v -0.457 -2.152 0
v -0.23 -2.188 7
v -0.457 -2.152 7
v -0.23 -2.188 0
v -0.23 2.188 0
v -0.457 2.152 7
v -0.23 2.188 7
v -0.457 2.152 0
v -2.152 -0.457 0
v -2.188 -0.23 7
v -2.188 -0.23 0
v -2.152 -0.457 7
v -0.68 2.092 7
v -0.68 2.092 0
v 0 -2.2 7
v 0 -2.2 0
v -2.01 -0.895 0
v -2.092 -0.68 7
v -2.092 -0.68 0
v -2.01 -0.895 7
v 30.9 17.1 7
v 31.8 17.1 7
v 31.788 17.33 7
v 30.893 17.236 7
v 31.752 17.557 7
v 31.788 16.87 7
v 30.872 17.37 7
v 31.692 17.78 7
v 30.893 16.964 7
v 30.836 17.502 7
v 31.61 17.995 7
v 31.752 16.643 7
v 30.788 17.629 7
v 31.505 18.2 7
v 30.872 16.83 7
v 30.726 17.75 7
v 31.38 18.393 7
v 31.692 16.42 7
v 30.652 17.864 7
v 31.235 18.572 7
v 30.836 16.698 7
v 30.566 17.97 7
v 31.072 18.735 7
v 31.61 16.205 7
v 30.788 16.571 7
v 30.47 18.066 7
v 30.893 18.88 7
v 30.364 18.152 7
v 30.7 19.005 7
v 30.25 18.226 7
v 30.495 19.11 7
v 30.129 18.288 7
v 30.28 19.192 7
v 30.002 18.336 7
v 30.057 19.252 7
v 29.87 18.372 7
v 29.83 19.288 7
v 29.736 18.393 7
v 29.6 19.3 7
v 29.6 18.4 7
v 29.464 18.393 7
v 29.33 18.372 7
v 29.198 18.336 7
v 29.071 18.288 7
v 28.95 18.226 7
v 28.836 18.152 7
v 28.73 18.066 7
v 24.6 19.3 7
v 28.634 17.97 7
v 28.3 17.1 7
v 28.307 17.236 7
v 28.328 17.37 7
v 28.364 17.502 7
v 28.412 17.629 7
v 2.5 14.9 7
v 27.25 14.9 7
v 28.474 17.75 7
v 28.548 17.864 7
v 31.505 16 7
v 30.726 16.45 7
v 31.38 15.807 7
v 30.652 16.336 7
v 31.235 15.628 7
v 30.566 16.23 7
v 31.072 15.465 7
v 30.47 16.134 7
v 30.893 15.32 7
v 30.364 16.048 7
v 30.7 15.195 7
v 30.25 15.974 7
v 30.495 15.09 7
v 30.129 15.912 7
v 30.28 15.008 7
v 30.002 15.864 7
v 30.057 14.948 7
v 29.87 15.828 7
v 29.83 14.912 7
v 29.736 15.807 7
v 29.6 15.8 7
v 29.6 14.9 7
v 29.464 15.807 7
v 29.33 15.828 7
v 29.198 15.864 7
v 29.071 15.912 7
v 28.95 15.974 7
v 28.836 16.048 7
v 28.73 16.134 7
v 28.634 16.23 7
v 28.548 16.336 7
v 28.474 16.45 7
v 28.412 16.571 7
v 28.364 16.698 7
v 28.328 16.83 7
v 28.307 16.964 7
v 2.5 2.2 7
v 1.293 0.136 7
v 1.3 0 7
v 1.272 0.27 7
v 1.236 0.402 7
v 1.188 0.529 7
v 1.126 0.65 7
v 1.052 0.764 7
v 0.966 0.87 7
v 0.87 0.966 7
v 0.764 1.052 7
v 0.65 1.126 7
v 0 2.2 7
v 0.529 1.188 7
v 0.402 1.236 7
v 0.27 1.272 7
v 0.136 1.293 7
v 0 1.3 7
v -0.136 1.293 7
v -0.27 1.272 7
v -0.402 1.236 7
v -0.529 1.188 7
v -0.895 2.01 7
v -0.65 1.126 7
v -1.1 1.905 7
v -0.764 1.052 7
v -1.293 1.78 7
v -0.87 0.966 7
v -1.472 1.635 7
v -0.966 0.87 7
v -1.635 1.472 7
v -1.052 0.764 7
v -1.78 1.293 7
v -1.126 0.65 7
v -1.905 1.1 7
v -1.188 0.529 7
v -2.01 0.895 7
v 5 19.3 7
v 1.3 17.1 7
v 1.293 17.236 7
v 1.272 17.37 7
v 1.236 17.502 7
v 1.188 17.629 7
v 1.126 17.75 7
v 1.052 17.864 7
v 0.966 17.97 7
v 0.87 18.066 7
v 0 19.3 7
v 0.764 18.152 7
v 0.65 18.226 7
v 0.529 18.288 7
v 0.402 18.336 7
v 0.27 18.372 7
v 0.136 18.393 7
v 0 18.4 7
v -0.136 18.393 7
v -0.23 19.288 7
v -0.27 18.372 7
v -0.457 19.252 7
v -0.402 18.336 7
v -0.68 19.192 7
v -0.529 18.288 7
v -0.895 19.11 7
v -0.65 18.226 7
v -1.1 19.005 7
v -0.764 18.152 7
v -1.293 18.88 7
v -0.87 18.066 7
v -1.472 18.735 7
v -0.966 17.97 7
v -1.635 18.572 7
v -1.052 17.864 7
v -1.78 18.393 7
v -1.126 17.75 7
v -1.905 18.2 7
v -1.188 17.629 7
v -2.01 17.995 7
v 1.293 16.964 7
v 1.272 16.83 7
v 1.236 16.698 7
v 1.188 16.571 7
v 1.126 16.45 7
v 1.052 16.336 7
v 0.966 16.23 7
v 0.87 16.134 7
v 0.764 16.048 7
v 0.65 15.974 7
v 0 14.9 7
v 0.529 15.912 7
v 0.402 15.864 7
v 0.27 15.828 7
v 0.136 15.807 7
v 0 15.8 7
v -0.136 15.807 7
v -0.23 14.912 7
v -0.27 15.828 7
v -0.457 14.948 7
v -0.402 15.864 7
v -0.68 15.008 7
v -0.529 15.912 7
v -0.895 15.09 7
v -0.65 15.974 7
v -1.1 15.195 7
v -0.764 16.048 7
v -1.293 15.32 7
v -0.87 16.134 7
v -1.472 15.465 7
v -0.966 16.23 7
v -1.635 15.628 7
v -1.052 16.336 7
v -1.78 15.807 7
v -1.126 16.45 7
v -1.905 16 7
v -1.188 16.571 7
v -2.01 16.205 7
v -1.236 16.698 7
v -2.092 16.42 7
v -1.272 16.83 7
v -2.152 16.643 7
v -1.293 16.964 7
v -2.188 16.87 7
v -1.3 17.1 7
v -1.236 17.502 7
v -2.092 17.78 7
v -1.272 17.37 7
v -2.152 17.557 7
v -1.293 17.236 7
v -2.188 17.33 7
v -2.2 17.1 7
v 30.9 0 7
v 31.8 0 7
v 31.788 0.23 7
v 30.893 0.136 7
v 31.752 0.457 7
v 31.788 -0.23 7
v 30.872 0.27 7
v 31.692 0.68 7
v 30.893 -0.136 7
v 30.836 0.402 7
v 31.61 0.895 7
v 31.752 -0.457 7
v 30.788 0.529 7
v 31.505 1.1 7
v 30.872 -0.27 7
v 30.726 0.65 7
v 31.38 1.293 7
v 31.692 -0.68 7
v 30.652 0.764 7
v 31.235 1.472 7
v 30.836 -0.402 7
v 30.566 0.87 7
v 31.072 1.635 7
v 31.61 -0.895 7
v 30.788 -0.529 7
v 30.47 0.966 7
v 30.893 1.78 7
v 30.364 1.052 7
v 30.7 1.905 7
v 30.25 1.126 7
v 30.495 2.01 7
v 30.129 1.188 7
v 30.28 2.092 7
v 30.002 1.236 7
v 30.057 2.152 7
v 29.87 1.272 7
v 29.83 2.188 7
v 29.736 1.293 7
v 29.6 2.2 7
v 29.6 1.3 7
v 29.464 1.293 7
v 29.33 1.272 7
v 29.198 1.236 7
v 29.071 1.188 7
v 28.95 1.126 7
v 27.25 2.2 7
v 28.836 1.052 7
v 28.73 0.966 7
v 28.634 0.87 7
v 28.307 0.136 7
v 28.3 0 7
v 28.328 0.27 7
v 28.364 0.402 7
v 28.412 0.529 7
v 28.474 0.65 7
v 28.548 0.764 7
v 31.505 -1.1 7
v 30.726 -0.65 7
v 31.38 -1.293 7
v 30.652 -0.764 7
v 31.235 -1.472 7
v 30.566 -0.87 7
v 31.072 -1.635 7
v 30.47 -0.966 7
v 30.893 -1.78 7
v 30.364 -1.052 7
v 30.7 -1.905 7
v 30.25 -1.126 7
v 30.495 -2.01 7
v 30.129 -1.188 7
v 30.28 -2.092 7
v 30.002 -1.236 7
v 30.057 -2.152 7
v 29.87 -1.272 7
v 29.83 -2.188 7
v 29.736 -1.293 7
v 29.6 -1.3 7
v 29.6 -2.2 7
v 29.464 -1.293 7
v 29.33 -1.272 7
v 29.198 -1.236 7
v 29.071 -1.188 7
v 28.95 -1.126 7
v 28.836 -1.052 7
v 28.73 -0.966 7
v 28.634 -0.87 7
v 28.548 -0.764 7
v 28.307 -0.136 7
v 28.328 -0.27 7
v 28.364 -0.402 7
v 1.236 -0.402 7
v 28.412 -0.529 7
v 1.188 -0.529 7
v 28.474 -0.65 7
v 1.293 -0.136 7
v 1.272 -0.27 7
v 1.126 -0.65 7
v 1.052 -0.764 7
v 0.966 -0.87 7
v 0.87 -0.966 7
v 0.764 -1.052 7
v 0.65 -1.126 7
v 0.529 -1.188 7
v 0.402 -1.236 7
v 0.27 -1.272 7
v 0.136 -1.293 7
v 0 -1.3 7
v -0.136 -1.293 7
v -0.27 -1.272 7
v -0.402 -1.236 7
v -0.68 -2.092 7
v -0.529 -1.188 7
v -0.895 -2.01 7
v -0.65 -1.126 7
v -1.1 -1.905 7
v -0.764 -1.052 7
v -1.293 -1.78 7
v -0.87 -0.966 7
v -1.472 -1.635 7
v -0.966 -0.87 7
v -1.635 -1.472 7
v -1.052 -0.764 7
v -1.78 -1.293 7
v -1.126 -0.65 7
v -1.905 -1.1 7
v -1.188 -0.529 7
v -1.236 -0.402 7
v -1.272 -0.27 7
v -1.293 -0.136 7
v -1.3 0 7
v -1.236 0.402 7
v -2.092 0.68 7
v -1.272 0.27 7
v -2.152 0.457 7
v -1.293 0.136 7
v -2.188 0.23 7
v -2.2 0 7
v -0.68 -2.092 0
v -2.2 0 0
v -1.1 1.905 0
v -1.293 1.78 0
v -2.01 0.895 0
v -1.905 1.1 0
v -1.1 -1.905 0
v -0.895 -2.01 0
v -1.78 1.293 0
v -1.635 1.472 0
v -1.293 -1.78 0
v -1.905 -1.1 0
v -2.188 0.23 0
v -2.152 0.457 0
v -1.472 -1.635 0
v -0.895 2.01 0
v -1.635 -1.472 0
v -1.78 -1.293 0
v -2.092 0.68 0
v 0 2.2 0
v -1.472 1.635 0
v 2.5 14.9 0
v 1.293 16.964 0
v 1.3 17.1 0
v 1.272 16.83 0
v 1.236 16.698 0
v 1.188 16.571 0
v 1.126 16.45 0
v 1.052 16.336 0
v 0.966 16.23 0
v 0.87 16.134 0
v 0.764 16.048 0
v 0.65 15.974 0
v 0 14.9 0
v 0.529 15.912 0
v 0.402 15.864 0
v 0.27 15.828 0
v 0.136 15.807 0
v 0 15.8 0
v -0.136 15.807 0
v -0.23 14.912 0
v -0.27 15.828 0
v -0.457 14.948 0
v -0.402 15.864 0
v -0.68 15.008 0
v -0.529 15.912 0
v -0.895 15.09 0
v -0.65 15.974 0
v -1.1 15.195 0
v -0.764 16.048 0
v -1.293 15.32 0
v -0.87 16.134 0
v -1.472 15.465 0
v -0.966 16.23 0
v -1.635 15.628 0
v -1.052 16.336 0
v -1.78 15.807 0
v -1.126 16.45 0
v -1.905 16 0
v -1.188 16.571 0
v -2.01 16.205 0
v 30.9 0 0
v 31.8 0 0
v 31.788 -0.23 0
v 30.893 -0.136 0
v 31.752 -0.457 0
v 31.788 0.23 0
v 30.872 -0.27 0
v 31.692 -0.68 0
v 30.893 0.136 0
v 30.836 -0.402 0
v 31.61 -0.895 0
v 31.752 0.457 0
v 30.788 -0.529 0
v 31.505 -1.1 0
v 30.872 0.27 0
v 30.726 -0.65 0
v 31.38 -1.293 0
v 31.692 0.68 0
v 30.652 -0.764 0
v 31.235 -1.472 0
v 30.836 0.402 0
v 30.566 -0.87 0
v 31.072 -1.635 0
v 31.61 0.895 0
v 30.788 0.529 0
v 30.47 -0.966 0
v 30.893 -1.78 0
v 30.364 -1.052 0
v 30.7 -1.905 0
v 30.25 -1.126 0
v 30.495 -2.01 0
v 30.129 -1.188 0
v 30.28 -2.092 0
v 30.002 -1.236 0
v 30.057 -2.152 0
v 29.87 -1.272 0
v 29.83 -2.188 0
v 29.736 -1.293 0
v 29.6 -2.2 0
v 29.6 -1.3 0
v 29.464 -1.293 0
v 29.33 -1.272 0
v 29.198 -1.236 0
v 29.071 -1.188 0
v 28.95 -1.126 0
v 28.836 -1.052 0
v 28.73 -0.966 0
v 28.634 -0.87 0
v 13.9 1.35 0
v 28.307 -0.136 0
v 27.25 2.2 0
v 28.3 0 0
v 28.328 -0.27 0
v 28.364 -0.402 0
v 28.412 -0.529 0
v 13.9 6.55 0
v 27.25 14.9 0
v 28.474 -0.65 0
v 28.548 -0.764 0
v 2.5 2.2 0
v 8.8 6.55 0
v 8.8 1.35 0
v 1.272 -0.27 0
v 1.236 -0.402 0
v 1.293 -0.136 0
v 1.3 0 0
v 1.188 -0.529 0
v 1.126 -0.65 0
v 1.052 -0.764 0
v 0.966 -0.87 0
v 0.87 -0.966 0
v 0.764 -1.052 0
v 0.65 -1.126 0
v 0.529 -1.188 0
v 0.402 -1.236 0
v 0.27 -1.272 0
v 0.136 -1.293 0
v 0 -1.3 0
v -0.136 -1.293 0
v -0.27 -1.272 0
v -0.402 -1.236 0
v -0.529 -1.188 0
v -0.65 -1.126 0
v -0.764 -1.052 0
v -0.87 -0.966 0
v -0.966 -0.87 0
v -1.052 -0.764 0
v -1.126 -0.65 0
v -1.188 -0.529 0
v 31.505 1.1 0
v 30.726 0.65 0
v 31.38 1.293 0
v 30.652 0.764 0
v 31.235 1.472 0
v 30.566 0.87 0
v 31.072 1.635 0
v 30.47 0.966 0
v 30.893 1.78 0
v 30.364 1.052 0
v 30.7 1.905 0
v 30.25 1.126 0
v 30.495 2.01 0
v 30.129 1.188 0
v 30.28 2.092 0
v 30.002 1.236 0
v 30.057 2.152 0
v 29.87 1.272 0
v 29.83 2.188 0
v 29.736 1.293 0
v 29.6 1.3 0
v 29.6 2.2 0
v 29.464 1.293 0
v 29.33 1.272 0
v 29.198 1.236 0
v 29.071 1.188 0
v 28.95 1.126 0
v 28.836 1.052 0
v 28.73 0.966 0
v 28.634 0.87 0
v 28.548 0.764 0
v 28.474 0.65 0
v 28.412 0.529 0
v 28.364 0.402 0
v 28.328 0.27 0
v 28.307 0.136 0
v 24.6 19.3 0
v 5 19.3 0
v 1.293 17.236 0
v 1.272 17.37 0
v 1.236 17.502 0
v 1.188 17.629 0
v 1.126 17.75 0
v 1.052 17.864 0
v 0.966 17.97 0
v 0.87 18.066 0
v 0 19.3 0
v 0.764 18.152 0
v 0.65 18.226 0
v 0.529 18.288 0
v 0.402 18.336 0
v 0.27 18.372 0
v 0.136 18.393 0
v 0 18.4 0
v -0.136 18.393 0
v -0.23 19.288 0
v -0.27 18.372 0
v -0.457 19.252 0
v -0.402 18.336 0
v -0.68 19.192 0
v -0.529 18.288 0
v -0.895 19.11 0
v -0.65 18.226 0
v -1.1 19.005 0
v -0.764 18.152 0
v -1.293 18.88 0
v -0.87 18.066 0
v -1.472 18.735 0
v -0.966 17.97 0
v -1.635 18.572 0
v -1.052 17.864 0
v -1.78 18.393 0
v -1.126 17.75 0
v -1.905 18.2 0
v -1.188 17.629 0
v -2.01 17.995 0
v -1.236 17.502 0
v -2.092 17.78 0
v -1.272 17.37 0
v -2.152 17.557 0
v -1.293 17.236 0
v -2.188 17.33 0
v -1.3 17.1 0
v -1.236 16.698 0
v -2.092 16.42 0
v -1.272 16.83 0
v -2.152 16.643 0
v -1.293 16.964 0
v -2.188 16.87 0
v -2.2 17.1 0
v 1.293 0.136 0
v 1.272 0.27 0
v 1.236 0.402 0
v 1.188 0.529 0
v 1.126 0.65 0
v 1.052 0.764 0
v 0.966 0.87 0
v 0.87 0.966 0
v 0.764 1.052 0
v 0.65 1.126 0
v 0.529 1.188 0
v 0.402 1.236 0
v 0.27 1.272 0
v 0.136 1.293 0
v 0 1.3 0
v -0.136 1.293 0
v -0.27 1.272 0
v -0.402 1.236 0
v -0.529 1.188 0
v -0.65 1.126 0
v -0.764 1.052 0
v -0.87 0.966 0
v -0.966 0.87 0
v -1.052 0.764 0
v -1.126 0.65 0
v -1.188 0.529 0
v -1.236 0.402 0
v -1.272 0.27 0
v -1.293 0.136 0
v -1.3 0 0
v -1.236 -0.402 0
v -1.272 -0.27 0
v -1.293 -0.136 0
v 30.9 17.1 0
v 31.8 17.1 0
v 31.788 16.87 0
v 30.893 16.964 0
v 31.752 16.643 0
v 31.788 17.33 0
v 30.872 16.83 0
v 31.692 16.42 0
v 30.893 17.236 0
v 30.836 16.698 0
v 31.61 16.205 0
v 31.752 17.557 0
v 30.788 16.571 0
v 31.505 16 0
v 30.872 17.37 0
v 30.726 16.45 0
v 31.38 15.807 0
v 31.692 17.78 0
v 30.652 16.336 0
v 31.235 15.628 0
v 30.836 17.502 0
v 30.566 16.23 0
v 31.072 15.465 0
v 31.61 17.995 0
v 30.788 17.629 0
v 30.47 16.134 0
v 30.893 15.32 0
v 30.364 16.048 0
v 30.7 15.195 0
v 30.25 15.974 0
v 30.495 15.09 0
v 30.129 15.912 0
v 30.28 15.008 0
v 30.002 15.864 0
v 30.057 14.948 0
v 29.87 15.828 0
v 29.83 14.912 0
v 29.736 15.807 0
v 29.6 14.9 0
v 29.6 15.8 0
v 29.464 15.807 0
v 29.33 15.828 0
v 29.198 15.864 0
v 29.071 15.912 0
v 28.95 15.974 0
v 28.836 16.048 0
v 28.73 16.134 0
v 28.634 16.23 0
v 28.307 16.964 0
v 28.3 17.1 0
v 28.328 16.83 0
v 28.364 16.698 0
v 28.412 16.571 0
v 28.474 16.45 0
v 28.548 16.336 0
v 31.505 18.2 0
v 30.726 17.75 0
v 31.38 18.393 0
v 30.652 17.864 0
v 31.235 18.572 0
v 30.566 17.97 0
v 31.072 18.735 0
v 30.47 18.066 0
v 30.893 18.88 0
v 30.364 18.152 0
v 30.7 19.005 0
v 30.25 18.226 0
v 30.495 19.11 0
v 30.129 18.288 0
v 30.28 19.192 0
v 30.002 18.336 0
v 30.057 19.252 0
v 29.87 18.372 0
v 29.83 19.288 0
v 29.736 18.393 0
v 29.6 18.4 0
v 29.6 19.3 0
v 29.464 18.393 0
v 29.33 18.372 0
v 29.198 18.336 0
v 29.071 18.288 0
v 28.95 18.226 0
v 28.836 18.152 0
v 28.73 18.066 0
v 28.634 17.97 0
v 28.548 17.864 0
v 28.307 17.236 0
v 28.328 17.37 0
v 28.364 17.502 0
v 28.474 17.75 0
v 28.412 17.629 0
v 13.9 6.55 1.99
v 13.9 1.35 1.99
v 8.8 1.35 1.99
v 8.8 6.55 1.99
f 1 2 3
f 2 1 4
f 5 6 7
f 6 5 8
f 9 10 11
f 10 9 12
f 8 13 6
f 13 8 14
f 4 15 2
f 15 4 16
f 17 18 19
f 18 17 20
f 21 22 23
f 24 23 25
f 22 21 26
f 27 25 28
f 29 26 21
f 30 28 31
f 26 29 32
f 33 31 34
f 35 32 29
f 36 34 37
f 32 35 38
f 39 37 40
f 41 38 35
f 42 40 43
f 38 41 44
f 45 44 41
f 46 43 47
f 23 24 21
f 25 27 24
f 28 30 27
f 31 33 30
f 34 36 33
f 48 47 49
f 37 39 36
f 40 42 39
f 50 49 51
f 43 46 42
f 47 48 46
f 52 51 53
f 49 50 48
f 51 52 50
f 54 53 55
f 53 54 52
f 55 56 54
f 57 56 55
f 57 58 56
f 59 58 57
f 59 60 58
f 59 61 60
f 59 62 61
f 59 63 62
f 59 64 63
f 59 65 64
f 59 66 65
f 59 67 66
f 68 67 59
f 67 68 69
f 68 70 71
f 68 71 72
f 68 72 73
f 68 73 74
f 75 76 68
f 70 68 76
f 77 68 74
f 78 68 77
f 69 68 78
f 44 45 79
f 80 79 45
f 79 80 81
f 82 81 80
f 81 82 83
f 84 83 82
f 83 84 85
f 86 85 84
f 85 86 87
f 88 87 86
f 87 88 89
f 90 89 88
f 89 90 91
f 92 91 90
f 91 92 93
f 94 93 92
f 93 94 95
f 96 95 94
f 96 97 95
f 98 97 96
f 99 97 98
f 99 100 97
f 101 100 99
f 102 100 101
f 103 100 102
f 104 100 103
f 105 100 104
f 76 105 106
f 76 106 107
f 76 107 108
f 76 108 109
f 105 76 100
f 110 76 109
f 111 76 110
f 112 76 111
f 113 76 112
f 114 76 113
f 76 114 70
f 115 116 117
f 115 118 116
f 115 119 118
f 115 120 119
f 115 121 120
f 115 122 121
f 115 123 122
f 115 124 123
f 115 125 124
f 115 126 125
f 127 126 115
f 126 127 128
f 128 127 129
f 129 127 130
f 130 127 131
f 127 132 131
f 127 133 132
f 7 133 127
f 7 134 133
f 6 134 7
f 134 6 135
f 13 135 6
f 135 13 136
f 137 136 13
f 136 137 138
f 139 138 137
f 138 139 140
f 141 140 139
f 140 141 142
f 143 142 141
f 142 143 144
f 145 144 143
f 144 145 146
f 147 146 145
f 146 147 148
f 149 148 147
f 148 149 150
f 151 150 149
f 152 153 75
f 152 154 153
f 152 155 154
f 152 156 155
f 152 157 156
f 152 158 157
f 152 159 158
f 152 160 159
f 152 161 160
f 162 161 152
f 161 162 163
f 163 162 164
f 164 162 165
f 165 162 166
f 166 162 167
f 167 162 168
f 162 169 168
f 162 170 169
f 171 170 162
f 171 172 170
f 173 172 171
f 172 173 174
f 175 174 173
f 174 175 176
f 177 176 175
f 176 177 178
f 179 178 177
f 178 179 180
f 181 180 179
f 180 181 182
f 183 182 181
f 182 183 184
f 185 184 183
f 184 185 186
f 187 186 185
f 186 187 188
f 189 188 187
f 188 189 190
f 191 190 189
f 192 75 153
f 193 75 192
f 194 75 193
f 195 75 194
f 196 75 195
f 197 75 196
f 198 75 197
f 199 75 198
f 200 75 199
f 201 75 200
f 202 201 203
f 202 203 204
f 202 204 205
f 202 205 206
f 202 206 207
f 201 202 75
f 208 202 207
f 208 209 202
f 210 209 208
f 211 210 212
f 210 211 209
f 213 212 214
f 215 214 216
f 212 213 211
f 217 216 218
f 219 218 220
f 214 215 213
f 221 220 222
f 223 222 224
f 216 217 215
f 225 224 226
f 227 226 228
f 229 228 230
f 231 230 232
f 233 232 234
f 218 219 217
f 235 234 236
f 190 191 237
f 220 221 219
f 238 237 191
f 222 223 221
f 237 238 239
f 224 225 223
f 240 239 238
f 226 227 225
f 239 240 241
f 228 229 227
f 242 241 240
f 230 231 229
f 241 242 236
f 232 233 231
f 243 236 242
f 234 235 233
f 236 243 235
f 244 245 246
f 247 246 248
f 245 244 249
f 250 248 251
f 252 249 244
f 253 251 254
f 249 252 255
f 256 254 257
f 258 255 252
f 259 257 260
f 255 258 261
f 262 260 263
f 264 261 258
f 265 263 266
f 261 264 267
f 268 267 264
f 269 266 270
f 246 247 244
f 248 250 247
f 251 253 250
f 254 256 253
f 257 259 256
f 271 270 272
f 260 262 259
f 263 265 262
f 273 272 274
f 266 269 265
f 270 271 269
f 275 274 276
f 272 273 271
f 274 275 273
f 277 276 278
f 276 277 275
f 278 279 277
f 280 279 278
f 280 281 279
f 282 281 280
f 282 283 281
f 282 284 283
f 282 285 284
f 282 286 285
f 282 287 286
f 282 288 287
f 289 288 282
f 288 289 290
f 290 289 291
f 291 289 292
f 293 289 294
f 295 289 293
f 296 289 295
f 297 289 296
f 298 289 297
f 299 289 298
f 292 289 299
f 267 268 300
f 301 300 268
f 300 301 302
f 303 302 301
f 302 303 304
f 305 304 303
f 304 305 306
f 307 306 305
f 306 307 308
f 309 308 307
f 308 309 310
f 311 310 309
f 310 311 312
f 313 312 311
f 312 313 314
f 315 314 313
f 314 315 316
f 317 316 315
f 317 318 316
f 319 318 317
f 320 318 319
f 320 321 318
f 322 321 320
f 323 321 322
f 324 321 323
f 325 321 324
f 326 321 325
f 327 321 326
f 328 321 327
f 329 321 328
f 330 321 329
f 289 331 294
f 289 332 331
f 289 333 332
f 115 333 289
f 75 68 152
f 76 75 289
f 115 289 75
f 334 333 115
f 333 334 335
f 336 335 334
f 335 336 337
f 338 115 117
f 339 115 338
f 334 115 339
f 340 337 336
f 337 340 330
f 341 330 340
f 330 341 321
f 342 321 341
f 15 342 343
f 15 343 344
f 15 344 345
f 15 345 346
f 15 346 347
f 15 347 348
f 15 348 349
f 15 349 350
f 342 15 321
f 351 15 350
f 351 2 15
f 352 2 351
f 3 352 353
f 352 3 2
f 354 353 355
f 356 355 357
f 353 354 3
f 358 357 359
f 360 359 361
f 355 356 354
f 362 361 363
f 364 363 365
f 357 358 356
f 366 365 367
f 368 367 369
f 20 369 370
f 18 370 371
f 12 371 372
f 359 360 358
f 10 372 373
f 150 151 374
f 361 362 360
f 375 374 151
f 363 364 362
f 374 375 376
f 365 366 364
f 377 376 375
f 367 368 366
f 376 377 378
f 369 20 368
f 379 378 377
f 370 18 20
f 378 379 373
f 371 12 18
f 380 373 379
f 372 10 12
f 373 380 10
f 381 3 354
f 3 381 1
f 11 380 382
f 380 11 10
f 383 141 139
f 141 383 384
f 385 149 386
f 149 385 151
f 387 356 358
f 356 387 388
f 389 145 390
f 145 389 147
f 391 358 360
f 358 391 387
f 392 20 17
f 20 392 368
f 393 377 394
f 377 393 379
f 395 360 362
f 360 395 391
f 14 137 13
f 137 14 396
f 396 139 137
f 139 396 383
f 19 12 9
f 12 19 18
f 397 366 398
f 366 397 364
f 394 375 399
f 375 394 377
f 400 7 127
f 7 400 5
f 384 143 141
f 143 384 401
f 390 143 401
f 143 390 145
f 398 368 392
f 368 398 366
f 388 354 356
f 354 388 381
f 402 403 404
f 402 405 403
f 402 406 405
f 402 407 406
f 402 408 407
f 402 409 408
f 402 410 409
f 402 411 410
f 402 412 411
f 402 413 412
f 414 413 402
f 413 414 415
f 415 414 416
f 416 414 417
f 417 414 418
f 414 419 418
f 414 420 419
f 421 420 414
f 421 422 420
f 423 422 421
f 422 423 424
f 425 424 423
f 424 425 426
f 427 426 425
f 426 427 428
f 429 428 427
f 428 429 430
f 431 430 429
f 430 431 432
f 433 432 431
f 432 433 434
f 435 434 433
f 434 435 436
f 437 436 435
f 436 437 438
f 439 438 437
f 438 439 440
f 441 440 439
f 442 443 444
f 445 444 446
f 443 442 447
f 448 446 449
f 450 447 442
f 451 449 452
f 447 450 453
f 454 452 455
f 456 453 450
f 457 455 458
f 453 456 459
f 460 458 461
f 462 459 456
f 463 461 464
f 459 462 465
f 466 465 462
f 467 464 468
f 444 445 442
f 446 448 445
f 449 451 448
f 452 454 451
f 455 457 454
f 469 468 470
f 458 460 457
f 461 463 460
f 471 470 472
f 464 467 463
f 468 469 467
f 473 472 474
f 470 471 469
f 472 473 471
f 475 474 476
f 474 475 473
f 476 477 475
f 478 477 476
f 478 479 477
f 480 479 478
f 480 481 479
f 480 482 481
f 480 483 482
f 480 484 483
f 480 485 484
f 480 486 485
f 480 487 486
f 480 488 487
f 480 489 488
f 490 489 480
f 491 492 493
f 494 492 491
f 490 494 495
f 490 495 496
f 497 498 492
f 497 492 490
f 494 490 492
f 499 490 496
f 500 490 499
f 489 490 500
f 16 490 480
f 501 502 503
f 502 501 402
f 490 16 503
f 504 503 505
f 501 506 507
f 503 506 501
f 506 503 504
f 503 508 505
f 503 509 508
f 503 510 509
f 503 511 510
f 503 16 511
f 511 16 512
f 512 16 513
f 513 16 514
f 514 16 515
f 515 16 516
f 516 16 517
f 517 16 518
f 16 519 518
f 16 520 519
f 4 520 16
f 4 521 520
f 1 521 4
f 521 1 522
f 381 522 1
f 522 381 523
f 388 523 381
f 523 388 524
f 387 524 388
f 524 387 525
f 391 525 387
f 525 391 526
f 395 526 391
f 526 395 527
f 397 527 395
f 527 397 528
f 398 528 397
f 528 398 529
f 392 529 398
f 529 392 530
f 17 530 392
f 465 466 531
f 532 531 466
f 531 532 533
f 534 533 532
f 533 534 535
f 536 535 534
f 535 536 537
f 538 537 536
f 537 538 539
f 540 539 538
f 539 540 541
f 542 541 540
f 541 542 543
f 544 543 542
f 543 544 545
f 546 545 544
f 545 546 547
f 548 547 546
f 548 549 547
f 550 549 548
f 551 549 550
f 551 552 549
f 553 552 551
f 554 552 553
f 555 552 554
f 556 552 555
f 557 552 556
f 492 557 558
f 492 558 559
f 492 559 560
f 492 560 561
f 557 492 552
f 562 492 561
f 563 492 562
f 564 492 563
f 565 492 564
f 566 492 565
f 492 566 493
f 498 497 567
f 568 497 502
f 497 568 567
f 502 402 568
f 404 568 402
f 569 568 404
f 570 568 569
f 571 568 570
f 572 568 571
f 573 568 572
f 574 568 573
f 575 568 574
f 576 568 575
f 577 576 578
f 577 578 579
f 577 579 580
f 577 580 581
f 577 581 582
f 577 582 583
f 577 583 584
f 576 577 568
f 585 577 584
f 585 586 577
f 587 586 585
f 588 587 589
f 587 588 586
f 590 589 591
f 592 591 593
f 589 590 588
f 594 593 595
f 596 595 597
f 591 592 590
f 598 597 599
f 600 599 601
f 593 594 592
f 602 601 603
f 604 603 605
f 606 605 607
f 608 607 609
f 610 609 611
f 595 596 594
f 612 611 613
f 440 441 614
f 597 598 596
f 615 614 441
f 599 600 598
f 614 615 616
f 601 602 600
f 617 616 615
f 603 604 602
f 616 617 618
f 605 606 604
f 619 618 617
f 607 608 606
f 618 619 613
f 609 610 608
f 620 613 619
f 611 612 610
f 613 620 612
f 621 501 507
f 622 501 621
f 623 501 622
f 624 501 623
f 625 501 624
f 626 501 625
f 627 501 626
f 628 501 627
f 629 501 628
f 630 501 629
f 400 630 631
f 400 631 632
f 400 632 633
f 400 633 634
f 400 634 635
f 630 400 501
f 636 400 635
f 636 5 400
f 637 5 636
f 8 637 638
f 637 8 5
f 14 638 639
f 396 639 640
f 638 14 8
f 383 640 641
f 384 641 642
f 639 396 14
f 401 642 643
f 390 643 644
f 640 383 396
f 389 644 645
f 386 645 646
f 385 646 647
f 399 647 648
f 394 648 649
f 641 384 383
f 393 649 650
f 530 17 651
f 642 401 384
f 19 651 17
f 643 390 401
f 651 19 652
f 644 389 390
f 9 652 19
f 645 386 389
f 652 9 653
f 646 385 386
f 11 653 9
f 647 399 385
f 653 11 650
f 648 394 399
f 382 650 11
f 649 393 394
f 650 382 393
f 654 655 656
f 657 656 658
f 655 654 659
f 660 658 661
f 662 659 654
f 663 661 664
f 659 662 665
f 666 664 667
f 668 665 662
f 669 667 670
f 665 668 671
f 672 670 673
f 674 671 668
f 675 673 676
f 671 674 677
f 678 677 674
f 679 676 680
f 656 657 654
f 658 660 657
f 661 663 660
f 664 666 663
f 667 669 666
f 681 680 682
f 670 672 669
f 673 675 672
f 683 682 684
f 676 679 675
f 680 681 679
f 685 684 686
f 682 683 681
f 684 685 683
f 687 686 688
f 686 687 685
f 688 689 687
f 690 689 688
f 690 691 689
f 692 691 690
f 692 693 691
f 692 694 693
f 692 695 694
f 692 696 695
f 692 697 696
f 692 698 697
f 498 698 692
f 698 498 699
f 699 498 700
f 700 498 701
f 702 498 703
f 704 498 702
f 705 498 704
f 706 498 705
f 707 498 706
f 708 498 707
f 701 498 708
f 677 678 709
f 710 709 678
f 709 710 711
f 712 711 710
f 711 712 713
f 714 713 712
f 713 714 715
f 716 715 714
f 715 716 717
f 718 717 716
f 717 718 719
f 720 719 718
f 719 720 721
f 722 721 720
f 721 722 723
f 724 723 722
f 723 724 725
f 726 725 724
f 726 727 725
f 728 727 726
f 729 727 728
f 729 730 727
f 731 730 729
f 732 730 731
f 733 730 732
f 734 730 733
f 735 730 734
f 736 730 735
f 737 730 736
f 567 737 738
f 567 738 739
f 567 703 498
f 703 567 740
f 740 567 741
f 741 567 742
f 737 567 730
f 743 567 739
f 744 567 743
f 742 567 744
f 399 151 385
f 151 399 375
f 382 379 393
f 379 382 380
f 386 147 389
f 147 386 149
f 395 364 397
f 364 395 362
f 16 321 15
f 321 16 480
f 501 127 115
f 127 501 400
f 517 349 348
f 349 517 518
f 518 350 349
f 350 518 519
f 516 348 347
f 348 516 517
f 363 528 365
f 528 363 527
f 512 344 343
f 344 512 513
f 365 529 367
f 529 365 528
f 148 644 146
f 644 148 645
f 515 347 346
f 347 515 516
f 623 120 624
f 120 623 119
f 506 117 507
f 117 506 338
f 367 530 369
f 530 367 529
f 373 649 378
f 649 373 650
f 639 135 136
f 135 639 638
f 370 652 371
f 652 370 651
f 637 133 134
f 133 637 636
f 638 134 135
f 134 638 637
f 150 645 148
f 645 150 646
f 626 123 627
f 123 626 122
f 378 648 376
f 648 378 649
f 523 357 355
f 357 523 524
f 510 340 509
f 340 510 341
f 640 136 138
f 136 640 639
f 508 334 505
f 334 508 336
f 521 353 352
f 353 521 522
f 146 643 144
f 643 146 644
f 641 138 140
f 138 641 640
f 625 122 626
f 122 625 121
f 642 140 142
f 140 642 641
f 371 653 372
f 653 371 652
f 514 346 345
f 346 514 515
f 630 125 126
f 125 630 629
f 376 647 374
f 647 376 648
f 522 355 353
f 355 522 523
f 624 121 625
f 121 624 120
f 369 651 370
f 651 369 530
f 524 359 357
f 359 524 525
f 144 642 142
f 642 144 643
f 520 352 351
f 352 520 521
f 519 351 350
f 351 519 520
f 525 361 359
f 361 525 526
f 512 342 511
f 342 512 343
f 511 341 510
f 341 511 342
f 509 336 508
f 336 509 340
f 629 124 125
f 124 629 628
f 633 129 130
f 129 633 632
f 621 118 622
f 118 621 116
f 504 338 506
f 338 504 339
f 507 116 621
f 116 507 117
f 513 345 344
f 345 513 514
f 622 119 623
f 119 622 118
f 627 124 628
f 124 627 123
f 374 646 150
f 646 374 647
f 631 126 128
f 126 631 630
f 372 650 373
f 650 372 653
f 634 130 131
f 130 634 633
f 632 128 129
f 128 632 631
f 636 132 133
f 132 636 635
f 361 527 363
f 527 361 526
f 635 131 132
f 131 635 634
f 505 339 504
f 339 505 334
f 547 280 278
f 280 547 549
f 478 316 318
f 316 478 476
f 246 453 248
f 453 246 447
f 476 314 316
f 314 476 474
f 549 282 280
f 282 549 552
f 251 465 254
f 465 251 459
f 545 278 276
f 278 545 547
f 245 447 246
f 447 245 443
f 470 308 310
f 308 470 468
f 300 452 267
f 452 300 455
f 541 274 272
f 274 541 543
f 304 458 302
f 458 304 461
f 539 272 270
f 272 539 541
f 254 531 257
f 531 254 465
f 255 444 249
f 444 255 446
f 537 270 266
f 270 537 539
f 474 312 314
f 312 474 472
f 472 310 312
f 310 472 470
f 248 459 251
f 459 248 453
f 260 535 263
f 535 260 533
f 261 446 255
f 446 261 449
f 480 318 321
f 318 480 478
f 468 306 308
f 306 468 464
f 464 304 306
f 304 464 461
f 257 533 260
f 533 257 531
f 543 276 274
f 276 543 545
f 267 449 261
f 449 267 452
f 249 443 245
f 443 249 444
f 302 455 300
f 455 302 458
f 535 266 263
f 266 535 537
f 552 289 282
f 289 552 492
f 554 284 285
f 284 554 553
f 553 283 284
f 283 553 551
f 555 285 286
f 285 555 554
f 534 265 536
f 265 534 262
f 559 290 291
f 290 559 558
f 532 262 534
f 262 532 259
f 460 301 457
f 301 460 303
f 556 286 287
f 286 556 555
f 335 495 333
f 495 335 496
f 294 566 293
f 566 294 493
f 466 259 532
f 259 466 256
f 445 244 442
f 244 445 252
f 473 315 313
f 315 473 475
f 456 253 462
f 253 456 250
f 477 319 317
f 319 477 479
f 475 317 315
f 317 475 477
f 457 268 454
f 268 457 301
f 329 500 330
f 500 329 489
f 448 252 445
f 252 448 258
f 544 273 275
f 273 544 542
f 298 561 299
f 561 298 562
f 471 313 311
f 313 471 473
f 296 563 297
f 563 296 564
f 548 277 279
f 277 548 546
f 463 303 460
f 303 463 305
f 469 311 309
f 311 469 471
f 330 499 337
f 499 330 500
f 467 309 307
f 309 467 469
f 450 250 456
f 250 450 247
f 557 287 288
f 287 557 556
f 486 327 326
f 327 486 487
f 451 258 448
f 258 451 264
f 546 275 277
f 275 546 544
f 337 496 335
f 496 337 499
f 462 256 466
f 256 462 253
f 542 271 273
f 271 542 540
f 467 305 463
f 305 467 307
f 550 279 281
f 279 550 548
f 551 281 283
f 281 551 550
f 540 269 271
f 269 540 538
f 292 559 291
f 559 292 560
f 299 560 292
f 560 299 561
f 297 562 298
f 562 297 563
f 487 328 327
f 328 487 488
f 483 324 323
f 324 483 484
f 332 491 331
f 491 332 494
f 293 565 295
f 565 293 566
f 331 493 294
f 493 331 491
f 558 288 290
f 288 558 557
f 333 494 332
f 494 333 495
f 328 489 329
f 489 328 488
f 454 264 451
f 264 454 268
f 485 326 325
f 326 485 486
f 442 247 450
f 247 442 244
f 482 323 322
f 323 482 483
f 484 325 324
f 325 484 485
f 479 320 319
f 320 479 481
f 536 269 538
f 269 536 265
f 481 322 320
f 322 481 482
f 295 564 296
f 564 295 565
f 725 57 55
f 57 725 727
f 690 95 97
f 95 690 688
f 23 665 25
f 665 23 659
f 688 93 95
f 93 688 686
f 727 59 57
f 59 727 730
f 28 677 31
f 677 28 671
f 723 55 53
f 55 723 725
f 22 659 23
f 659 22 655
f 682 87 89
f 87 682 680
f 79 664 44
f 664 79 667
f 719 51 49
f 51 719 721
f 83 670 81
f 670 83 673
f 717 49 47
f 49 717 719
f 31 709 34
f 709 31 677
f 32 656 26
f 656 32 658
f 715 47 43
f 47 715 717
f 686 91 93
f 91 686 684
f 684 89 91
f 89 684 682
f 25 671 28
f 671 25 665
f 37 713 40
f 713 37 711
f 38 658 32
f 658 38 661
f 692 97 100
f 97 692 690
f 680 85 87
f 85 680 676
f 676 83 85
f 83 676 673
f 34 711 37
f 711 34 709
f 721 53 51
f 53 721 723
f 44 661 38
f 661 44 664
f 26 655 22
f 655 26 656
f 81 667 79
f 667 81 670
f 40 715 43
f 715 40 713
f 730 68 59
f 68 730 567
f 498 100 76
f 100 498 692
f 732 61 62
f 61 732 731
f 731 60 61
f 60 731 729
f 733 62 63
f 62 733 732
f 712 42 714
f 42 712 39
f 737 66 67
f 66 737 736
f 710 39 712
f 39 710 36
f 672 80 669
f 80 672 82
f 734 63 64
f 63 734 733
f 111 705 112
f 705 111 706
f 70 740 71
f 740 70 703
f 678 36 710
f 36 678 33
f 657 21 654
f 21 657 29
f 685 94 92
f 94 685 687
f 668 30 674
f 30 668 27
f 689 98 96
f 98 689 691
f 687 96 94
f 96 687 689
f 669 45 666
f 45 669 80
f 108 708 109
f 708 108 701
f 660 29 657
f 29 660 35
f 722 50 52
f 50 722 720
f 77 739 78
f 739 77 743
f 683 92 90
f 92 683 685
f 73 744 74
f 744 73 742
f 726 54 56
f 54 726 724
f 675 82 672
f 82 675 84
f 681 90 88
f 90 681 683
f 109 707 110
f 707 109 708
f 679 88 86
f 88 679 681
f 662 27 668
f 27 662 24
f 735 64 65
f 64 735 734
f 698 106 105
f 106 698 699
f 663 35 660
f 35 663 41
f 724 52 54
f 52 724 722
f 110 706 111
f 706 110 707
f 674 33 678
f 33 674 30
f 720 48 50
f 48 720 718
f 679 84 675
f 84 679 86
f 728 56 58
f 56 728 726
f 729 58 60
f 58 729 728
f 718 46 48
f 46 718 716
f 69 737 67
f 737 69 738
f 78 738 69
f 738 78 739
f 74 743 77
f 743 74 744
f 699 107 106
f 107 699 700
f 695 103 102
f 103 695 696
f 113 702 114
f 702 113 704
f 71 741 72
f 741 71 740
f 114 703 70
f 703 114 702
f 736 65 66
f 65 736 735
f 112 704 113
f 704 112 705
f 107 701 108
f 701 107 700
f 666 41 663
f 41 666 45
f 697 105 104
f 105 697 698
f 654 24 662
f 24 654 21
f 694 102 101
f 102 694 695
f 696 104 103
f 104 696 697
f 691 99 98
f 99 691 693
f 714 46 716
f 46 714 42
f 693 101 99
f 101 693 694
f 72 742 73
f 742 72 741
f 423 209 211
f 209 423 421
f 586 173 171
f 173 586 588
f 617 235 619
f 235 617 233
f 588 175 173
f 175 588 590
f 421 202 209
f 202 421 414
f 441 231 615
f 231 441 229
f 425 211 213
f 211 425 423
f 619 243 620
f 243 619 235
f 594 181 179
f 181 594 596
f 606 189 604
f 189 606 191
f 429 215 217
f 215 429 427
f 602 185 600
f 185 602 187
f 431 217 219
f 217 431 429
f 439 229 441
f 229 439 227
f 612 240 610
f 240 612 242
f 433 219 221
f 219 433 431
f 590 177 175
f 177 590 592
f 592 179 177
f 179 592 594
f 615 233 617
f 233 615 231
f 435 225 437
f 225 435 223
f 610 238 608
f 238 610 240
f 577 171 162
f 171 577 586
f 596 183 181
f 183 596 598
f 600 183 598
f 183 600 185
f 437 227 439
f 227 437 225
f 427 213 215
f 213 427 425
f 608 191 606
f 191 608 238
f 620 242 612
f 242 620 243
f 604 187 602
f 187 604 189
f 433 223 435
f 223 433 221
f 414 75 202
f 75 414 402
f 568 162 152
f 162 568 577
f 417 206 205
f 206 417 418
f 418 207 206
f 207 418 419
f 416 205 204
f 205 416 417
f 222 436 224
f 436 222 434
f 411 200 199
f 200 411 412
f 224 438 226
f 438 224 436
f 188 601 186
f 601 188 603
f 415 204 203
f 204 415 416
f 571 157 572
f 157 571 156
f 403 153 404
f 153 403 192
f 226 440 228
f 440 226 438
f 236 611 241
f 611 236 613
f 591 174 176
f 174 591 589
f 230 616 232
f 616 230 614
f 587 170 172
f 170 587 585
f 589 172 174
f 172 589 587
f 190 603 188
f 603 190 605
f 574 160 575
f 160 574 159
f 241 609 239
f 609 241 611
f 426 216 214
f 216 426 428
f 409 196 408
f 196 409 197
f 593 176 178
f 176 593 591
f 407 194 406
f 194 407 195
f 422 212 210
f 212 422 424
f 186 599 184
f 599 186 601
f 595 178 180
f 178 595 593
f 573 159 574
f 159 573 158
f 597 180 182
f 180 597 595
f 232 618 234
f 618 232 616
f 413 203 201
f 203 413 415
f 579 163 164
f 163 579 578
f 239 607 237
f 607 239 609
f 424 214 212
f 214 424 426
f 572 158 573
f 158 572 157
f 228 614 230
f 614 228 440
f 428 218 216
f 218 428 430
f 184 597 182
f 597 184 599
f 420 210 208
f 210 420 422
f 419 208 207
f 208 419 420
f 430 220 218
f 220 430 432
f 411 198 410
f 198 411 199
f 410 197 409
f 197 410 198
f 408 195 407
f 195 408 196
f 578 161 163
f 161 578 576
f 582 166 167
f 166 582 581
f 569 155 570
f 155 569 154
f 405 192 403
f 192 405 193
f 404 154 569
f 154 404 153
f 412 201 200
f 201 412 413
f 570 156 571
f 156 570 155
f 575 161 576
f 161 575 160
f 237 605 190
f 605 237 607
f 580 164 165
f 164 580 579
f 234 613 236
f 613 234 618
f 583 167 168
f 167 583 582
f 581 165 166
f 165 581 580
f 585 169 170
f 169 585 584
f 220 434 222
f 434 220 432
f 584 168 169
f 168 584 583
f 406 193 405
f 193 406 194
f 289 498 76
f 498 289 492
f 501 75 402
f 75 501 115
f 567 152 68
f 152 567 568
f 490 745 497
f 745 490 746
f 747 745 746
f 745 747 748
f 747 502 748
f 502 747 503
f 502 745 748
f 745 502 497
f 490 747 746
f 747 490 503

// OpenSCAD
$fn=60;

h=7;



module flange() {
    difference() {
        union() {
            cylinder(r=2.2, h=h, center=false);
            translate([-2.2, 0, 0]) cube([2.2 * 2, 5, h], center=false);
        }
        translate([0,0,-0.01]) cylinder(r=1.3, h=h+0.1, center=false);
    }
}

difference() {
    union() {
        rotate([0,0,-90]) flange();
        translate([29.6, 0, 0]) rotate([0,0,90]) flange();
        translate([29.6, 17.1, 0]) rotate([0,0,90]) flange();
        translate([0, 17.1, 0]) rotate([0,0,-90]) flange();

        translate([1.5+1, -2.2, 0]) cube([26.75-2,21.5, h]);
    }
    
    //translate([8.8,10.55,-0.01]) cube([5.1,5.2,2]);
    translate([8.8,17.1-5.2-10.55,-0.01]) cube([5.1,5.2,2]);
    

   }
